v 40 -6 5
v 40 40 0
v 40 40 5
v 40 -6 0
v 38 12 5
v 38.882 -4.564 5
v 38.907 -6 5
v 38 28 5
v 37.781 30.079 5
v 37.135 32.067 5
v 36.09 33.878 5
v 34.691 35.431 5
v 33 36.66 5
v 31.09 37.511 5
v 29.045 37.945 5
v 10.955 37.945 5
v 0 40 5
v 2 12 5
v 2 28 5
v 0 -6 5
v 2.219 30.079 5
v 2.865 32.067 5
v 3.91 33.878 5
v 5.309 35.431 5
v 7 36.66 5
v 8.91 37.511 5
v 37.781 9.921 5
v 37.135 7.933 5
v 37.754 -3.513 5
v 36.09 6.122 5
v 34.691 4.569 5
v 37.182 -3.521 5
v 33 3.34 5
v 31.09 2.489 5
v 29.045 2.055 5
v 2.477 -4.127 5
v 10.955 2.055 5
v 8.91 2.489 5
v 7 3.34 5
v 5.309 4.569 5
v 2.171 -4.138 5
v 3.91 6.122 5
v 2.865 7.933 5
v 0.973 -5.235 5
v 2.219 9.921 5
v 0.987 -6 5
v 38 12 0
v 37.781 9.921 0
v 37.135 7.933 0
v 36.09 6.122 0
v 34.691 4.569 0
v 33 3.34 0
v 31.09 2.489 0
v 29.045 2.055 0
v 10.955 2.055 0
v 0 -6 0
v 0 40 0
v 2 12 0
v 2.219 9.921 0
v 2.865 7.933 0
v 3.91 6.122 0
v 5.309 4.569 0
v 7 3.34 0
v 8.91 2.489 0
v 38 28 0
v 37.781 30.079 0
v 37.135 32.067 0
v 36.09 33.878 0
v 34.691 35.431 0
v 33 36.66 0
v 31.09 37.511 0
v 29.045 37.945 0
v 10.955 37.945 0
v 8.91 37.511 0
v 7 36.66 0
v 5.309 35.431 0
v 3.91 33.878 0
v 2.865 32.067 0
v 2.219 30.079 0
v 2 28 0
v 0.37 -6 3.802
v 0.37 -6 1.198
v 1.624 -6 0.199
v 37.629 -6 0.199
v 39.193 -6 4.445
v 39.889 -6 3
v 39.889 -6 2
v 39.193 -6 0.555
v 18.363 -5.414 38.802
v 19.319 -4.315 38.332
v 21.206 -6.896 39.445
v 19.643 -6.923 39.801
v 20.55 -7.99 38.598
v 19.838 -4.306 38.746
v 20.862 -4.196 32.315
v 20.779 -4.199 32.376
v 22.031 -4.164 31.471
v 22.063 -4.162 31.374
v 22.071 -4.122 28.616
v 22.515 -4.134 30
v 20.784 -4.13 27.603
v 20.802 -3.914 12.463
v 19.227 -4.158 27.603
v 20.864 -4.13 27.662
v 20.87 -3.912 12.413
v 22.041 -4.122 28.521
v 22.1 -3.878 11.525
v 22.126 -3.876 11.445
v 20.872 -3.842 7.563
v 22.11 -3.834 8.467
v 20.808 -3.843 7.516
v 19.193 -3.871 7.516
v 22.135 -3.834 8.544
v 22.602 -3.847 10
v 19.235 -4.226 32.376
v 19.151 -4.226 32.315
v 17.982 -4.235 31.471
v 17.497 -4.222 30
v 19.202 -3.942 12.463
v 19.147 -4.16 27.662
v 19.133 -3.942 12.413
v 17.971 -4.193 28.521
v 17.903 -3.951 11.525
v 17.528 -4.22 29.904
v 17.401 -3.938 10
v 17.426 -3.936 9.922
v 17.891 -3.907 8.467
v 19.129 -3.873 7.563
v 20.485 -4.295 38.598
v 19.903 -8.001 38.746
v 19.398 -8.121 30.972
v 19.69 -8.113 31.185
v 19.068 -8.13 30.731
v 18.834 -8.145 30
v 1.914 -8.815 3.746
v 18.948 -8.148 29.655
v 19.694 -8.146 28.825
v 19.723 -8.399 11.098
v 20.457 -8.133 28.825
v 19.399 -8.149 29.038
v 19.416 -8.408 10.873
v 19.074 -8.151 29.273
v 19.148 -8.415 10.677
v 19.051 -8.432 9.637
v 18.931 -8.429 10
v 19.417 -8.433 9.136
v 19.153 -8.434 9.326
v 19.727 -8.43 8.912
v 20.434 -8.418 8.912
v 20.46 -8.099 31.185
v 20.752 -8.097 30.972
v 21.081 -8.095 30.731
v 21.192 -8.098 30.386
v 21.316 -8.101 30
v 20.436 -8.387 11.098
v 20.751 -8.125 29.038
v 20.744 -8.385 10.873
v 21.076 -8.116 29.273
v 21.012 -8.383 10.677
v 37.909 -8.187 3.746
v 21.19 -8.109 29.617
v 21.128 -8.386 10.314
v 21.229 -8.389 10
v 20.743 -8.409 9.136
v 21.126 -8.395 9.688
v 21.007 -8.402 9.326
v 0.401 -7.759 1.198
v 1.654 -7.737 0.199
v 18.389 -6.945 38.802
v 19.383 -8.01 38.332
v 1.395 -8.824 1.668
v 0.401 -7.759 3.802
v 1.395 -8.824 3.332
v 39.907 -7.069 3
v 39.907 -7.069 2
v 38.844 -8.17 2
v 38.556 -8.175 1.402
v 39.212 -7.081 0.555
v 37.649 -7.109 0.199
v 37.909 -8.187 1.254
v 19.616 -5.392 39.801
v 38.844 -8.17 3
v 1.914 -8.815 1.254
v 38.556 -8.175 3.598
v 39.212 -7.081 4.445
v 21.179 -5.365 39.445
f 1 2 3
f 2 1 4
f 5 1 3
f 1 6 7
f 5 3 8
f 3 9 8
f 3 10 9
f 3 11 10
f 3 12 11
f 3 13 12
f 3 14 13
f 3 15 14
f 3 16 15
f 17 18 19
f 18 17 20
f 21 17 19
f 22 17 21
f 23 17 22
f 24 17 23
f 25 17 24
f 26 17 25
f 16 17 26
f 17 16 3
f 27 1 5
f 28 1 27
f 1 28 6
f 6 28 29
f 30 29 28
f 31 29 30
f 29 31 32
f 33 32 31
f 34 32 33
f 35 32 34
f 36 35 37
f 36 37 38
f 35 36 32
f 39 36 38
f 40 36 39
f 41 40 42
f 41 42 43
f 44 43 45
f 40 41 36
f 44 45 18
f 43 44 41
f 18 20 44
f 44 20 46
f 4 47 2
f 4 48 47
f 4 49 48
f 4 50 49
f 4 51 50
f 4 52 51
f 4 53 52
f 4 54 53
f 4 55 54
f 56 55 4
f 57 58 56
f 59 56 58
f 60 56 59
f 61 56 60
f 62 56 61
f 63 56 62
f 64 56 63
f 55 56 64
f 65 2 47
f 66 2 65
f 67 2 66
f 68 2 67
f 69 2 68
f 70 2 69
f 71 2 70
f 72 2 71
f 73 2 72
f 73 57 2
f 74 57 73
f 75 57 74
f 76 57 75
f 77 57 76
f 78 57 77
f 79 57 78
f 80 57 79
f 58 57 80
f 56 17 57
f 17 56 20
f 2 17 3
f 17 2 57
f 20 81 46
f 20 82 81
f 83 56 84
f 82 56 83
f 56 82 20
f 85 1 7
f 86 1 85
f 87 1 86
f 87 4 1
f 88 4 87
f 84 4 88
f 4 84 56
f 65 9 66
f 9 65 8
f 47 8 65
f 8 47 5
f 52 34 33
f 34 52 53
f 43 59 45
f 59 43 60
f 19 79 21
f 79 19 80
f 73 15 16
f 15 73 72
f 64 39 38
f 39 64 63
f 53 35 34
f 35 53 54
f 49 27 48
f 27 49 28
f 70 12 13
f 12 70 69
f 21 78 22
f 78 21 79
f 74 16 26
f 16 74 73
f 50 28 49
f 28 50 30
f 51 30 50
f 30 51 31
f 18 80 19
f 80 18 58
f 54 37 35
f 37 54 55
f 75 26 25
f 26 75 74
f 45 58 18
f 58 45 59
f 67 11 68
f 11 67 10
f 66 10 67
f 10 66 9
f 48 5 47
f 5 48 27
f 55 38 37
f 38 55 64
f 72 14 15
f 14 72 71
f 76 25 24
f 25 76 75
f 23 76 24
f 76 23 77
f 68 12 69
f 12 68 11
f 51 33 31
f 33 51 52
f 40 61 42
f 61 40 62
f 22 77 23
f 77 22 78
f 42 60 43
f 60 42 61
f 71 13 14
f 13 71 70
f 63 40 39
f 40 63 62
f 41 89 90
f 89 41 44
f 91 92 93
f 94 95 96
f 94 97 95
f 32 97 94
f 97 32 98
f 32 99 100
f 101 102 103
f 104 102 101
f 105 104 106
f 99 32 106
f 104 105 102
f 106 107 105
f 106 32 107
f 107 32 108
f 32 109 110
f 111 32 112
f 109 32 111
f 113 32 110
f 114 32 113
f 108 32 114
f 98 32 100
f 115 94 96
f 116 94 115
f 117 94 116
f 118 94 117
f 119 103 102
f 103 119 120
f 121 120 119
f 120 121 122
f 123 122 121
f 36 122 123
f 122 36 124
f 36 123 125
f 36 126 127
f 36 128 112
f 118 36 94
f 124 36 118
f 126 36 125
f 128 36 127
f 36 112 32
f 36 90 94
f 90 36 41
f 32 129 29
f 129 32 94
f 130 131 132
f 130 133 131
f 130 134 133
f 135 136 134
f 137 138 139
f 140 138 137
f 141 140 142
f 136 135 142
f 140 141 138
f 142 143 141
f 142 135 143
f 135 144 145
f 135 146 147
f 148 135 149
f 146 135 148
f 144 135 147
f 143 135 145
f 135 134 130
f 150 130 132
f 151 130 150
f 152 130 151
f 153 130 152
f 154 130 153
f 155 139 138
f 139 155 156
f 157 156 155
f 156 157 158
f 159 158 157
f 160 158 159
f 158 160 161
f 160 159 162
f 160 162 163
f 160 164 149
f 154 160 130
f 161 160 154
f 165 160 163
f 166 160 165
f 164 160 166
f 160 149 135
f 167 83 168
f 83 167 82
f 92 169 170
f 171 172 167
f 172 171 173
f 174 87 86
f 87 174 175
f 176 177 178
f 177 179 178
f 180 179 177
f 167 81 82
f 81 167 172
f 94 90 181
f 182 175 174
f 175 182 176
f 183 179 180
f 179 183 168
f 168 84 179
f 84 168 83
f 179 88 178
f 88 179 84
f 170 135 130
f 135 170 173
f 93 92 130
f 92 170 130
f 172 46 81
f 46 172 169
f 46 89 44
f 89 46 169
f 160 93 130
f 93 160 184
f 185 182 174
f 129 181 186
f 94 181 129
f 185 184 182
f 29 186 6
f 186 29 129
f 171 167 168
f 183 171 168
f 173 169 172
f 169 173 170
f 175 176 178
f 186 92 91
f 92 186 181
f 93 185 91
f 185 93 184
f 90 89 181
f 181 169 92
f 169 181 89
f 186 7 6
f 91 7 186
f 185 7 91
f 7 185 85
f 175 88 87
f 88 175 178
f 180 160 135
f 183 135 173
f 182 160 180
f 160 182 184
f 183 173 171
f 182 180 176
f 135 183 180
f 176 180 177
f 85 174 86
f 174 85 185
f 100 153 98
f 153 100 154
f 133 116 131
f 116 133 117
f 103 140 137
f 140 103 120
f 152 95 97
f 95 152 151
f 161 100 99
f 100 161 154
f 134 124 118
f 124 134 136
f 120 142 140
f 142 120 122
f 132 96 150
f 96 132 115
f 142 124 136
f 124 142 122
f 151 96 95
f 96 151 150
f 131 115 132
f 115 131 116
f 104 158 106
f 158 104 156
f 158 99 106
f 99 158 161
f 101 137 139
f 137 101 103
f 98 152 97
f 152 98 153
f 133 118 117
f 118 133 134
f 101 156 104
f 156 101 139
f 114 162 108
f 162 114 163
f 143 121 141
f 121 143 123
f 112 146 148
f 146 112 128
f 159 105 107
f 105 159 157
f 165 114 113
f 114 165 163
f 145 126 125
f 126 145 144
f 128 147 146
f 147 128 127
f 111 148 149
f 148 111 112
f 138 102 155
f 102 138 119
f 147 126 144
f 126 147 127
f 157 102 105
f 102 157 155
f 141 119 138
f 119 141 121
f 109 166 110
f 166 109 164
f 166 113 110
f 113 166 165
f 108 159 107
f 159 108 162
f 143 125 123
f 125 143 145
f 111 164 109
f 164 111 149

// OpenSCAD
module round_cube(x,y,z,r){
hull(){ translate([r,r,r])sphere(r=r);
        translate([x-r,r,r])sphere(r=r);
        translate([r,y-r,r])sphere(r=r);
        translate([x-r,y-r,r])sphere(r=r);
        translate([r,r,z-r])sphere(r=r);
        translate([x-r,r,z-r])sphere(r=r);
        translate([r,y-r,z-r])sphere(r=r);
        translate([x-r,y-r,z-r])sphere(r=r);}}


/// VARIABLES
height=5;
internal_side=36;
thickness=2;
rounding_radius=2;
screw_head=3;
delta_mount_y=4;

// CALCULATED VARIABLES
external_side=internal_side+thickness*2;
invito=screw_head/4;
delta_wall=delta_mount_y+rounding_radius;

// Razor Holder
difference(){
    translate([0,-delta_wall,0])
        cube([external_side,external_side+delta_wall,height]);
    translate([thickness,thickness,-thickness])
    round_cube(internal_side,internal_side,height*1.5,height*2);}


// Wall mount
translate([0,rounding_radius-delta_wall,0])
rotate([90,0,1]) 
difference(){
    hull(){
        round_cube(external_side,height,height,rounding_radius);
        translate([20,38,2.5]) sphere(rounding_radius);}
    translate([external_side/2,external_side*4.5/6,-1]) cylinder(height+2,screw_head,invito);
    translate([external_side/2,external_side*1.5/6,-1]) cylinder(height+2,screw_head,invito);}
    
    
    
